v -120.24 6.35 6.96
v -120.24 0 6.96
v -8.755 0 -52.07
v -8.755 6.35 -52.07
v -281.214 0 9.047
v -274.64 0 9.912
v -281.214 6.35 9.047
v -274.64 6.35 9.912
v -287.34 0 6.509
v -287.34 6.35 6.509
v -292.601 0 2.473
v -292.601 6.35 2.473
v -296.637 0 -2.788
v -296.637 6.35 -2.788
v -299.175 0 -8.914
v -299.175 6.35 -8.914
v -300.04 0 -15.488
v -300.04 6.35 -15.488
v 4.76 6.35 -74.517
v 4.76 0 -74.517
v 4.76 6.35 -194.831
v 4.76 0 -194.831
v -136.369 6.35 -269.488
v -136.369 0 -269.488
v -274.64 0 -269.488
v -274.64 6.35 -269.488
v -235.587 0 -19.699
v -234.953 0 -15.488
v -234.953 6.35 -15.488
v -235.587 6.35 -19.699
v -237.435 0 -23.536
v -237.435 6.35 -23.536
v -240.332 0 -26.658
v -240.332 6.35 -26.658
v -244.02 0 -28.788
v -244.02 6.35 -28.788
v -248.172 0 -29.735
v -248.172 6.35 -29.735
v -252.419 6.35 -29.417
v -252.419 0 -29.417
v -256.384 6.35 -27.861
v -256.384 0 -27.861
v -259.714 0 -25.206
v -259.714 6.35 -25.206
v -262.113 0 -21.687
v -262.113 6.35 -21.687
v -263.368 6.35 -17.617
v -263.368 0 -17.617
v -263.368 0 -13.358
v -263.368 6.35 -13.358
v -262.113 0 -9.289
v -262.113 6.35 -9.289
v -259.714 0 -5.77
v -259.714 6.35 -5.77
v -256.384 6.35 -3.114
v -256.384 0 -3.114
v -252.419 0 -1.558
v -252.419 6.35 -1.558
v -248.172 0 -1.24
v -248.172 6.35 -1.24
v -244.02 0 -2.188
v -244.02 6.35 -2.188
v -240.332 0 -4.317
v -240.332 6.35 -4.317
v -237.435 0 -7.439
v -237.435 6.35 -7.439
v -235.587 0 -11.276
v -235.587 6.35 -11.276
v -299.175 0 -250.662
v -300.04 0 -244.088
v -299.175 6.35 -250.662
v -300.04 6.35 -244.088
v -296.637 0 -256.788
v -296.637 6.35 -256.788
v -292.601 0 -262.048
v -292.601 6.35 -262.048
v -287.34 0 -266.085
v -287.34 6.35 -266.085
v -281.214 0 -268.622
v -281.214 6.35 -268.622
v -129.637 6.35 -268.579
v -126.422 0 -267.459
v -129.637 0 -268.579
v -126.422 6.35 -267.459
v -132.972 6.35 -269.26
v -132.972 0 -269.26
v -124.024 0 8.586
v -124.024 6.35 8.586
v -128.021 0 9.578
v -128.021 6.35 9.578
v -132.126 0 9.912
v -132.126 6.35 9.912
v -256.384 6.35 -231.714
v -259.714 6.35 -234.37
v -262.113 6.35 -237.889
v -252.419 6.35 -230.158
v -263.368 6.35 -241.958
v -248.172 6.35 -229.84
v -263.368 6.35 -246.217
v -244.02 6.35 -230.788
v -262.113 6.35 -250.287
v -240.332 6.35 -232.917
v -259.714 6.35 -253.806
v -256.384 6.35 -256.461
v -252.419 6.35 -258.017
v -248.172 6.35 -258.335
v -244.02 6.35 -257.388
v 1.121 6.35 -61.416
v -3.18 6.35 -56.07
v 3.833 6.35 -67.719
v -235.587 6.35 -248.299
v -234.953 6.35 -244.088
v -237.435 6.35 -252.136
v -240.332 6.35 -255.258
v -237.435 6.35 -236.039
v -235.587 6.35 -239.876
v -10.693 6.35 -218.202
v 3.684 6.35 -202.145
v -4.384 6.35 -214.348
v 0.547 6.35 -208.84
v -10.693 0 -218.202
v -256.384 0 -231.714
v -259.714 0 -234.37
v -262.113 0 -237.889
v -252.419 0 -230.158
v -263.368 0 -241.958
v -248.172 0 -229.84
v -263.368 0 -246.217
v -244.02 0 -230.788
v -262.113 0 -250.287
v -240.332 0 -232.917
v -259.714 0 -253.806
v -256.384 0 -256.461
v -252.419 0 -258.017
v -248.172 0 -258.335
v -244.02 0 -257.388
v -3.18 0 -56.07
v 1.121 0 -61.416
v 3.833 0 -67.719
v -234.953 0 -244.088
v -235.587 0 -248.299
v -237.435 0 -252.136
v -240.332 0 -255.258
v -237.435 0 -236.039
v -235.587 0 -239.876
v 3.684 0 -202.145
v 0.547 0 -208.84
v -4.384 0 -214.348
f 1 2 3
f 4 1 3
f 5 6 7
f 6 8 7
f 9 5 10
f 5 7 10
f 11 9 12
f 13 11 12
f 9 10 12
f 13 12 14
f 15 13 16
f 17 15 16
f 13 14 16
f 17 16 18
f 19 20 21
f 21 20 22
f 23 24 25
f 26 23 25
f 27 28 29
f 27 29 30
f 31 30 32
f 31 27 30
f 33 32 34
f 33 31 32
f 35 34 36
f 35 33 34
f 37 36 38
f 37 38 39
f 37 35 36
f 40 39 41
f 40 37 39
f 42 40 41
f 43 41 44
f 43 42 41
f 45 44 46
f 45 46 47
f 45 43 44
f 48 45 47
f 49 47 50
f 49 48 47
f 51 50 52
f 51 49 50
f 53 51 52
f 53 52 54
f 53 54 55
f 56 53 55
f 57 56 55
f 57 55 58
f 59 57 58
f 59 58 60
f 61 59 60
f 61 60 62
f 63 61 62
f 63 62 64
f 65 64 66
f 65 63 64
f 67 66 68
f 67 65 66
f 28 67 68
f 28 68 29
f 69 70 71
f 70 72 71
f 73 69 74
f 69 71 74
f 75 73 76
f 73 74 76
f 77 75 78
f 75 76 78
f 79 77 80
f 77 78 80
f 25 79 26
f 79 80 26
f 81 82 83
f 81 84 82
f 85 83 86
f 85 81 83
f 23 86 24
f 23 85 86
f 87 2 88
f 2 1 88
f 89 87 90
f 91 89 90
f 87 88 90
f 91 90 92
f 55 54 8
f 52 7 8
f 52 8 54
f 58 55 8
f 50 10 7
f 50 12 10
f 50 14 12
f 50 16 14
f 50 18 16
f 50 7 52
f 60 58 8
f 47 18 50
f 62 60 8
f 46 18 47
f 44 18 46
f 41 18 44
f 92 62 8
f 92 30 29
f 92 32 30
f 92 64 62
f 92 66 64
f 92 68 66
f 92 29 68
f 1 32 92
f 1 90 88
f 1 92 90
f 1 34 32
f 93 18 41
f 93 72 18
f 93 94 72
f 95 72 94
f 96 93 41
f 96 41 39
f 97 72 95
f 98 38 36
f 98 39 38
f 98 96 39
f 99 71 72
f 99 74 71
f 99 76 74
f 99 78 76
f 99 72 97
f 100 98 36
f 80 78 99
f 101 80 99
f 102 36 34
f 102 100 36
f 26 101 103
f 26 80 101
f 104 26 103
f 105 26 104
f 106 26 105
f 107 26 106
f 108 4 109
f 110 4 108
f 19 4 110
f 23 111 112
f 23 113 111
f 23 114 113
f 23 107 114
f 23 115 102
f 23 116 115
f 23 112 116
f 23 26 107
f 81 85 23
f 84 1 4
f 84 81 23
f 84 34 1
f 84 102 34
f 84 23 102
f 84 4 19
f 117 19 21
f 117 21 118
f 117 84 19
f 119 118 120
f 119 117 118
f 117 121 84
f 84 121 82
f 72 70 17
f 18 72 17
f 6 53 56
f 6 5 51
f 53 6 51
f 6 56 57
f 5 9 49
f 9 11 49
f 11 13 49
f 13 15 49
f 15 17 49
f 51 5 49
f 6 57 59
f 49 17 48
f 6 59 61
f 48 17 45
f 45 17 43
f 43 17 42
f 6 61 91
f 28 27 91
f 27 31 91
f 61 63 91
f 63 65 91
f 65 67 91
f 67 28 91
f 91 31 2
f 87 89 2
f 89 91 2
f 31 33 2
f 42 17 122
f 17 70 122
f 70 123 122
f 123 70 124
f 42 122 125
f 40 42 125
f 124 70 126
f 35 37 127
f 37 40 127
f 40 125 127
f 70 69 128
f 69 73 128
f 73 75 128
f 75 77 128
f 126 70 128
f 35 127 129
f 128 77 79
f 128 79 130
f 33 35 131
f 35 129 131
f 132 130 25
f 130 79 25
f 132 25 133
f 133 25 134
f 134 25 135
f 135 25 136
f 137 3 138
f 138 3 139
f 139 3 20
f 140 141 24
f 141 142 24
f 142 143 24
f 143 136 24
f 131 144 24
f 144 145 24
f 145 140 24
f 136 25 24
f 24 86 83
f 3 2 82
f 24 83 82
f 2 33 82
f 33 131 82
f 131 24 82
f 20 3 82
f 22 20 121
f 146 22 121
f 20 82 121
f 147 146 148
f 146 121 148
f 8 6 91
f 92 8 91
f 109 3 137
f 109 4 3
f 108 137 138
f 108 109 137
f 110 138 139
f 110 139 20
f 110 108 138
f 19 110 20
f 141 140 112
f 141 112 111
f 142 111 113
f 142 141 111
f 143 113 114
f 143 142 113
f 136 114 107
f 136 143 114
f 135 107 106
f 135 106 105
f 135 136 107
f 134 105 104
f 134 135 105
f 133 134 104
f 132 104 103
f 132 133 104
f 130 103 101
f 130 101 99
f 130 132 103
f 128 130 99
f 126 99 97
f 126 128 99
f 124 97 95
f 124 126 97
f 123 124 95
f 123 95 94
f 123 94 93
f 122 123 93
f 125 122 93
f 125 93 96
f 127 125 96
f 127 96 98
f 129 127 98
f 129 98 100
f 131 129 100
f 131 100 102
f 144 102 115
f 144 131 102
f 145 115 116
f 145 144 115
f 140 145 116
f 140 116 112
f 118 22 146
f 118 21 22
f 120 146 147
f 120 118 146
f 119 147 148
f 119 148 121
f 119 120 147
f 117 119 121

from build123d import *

# Parameters (mm, degrees)
SKETCH1_R           = 14.2875
BOSS_EXTRUDE4_DEPTH = 6.35
FILLET3_R           = 25.4


with BuildPart() as part:
    # Sketch1 → Boss-Extrude4 (new body)
    with BuildSketch(Plane(origin=(0, 0, 0), x_dir=(1, 0, 0), z_dir=(0, 1, 0))):
        Polygon((-125.816166367, -9.912218002), (4.759892389, 59.225159329), (4.759892389, 211.625159329), (-131.188630818, 269.487781998), (-300.040107611, 269.487781998), (-300.040107611, -9.912218002), align=None)
        with Locations((-249.240107611, 244.087781998)):
            Circle(SKETCH1_R, mode=Mode.SUBTRACT)
        with Locations((-249.240107611, 15.487781998)):
            Circle(SKETCH1_R, mode=Mode.SUBTRACT)
    extrude(amount=BOSS_EXTRUDE4_DEPTH)

    # Fillet3
    fillet3_edges = [part.edges().sort_by_distance(p)[0] for p in [
        (-300.040107611, 3.175, 9.912218002),
        (-300.040107611, 3.175, -269.487781998),
        (-131.188630818, 3.175, -269.487781998),
        (4.759892389, 3.175, -211.625159329),
        (4.759892389, 3.175, -59.225159329),
        (-125.816166367, 3.175, 9.912218002),
    ]]
    fillet(fillet3_edges, radius=FILLET3_R)


solid = part.part
